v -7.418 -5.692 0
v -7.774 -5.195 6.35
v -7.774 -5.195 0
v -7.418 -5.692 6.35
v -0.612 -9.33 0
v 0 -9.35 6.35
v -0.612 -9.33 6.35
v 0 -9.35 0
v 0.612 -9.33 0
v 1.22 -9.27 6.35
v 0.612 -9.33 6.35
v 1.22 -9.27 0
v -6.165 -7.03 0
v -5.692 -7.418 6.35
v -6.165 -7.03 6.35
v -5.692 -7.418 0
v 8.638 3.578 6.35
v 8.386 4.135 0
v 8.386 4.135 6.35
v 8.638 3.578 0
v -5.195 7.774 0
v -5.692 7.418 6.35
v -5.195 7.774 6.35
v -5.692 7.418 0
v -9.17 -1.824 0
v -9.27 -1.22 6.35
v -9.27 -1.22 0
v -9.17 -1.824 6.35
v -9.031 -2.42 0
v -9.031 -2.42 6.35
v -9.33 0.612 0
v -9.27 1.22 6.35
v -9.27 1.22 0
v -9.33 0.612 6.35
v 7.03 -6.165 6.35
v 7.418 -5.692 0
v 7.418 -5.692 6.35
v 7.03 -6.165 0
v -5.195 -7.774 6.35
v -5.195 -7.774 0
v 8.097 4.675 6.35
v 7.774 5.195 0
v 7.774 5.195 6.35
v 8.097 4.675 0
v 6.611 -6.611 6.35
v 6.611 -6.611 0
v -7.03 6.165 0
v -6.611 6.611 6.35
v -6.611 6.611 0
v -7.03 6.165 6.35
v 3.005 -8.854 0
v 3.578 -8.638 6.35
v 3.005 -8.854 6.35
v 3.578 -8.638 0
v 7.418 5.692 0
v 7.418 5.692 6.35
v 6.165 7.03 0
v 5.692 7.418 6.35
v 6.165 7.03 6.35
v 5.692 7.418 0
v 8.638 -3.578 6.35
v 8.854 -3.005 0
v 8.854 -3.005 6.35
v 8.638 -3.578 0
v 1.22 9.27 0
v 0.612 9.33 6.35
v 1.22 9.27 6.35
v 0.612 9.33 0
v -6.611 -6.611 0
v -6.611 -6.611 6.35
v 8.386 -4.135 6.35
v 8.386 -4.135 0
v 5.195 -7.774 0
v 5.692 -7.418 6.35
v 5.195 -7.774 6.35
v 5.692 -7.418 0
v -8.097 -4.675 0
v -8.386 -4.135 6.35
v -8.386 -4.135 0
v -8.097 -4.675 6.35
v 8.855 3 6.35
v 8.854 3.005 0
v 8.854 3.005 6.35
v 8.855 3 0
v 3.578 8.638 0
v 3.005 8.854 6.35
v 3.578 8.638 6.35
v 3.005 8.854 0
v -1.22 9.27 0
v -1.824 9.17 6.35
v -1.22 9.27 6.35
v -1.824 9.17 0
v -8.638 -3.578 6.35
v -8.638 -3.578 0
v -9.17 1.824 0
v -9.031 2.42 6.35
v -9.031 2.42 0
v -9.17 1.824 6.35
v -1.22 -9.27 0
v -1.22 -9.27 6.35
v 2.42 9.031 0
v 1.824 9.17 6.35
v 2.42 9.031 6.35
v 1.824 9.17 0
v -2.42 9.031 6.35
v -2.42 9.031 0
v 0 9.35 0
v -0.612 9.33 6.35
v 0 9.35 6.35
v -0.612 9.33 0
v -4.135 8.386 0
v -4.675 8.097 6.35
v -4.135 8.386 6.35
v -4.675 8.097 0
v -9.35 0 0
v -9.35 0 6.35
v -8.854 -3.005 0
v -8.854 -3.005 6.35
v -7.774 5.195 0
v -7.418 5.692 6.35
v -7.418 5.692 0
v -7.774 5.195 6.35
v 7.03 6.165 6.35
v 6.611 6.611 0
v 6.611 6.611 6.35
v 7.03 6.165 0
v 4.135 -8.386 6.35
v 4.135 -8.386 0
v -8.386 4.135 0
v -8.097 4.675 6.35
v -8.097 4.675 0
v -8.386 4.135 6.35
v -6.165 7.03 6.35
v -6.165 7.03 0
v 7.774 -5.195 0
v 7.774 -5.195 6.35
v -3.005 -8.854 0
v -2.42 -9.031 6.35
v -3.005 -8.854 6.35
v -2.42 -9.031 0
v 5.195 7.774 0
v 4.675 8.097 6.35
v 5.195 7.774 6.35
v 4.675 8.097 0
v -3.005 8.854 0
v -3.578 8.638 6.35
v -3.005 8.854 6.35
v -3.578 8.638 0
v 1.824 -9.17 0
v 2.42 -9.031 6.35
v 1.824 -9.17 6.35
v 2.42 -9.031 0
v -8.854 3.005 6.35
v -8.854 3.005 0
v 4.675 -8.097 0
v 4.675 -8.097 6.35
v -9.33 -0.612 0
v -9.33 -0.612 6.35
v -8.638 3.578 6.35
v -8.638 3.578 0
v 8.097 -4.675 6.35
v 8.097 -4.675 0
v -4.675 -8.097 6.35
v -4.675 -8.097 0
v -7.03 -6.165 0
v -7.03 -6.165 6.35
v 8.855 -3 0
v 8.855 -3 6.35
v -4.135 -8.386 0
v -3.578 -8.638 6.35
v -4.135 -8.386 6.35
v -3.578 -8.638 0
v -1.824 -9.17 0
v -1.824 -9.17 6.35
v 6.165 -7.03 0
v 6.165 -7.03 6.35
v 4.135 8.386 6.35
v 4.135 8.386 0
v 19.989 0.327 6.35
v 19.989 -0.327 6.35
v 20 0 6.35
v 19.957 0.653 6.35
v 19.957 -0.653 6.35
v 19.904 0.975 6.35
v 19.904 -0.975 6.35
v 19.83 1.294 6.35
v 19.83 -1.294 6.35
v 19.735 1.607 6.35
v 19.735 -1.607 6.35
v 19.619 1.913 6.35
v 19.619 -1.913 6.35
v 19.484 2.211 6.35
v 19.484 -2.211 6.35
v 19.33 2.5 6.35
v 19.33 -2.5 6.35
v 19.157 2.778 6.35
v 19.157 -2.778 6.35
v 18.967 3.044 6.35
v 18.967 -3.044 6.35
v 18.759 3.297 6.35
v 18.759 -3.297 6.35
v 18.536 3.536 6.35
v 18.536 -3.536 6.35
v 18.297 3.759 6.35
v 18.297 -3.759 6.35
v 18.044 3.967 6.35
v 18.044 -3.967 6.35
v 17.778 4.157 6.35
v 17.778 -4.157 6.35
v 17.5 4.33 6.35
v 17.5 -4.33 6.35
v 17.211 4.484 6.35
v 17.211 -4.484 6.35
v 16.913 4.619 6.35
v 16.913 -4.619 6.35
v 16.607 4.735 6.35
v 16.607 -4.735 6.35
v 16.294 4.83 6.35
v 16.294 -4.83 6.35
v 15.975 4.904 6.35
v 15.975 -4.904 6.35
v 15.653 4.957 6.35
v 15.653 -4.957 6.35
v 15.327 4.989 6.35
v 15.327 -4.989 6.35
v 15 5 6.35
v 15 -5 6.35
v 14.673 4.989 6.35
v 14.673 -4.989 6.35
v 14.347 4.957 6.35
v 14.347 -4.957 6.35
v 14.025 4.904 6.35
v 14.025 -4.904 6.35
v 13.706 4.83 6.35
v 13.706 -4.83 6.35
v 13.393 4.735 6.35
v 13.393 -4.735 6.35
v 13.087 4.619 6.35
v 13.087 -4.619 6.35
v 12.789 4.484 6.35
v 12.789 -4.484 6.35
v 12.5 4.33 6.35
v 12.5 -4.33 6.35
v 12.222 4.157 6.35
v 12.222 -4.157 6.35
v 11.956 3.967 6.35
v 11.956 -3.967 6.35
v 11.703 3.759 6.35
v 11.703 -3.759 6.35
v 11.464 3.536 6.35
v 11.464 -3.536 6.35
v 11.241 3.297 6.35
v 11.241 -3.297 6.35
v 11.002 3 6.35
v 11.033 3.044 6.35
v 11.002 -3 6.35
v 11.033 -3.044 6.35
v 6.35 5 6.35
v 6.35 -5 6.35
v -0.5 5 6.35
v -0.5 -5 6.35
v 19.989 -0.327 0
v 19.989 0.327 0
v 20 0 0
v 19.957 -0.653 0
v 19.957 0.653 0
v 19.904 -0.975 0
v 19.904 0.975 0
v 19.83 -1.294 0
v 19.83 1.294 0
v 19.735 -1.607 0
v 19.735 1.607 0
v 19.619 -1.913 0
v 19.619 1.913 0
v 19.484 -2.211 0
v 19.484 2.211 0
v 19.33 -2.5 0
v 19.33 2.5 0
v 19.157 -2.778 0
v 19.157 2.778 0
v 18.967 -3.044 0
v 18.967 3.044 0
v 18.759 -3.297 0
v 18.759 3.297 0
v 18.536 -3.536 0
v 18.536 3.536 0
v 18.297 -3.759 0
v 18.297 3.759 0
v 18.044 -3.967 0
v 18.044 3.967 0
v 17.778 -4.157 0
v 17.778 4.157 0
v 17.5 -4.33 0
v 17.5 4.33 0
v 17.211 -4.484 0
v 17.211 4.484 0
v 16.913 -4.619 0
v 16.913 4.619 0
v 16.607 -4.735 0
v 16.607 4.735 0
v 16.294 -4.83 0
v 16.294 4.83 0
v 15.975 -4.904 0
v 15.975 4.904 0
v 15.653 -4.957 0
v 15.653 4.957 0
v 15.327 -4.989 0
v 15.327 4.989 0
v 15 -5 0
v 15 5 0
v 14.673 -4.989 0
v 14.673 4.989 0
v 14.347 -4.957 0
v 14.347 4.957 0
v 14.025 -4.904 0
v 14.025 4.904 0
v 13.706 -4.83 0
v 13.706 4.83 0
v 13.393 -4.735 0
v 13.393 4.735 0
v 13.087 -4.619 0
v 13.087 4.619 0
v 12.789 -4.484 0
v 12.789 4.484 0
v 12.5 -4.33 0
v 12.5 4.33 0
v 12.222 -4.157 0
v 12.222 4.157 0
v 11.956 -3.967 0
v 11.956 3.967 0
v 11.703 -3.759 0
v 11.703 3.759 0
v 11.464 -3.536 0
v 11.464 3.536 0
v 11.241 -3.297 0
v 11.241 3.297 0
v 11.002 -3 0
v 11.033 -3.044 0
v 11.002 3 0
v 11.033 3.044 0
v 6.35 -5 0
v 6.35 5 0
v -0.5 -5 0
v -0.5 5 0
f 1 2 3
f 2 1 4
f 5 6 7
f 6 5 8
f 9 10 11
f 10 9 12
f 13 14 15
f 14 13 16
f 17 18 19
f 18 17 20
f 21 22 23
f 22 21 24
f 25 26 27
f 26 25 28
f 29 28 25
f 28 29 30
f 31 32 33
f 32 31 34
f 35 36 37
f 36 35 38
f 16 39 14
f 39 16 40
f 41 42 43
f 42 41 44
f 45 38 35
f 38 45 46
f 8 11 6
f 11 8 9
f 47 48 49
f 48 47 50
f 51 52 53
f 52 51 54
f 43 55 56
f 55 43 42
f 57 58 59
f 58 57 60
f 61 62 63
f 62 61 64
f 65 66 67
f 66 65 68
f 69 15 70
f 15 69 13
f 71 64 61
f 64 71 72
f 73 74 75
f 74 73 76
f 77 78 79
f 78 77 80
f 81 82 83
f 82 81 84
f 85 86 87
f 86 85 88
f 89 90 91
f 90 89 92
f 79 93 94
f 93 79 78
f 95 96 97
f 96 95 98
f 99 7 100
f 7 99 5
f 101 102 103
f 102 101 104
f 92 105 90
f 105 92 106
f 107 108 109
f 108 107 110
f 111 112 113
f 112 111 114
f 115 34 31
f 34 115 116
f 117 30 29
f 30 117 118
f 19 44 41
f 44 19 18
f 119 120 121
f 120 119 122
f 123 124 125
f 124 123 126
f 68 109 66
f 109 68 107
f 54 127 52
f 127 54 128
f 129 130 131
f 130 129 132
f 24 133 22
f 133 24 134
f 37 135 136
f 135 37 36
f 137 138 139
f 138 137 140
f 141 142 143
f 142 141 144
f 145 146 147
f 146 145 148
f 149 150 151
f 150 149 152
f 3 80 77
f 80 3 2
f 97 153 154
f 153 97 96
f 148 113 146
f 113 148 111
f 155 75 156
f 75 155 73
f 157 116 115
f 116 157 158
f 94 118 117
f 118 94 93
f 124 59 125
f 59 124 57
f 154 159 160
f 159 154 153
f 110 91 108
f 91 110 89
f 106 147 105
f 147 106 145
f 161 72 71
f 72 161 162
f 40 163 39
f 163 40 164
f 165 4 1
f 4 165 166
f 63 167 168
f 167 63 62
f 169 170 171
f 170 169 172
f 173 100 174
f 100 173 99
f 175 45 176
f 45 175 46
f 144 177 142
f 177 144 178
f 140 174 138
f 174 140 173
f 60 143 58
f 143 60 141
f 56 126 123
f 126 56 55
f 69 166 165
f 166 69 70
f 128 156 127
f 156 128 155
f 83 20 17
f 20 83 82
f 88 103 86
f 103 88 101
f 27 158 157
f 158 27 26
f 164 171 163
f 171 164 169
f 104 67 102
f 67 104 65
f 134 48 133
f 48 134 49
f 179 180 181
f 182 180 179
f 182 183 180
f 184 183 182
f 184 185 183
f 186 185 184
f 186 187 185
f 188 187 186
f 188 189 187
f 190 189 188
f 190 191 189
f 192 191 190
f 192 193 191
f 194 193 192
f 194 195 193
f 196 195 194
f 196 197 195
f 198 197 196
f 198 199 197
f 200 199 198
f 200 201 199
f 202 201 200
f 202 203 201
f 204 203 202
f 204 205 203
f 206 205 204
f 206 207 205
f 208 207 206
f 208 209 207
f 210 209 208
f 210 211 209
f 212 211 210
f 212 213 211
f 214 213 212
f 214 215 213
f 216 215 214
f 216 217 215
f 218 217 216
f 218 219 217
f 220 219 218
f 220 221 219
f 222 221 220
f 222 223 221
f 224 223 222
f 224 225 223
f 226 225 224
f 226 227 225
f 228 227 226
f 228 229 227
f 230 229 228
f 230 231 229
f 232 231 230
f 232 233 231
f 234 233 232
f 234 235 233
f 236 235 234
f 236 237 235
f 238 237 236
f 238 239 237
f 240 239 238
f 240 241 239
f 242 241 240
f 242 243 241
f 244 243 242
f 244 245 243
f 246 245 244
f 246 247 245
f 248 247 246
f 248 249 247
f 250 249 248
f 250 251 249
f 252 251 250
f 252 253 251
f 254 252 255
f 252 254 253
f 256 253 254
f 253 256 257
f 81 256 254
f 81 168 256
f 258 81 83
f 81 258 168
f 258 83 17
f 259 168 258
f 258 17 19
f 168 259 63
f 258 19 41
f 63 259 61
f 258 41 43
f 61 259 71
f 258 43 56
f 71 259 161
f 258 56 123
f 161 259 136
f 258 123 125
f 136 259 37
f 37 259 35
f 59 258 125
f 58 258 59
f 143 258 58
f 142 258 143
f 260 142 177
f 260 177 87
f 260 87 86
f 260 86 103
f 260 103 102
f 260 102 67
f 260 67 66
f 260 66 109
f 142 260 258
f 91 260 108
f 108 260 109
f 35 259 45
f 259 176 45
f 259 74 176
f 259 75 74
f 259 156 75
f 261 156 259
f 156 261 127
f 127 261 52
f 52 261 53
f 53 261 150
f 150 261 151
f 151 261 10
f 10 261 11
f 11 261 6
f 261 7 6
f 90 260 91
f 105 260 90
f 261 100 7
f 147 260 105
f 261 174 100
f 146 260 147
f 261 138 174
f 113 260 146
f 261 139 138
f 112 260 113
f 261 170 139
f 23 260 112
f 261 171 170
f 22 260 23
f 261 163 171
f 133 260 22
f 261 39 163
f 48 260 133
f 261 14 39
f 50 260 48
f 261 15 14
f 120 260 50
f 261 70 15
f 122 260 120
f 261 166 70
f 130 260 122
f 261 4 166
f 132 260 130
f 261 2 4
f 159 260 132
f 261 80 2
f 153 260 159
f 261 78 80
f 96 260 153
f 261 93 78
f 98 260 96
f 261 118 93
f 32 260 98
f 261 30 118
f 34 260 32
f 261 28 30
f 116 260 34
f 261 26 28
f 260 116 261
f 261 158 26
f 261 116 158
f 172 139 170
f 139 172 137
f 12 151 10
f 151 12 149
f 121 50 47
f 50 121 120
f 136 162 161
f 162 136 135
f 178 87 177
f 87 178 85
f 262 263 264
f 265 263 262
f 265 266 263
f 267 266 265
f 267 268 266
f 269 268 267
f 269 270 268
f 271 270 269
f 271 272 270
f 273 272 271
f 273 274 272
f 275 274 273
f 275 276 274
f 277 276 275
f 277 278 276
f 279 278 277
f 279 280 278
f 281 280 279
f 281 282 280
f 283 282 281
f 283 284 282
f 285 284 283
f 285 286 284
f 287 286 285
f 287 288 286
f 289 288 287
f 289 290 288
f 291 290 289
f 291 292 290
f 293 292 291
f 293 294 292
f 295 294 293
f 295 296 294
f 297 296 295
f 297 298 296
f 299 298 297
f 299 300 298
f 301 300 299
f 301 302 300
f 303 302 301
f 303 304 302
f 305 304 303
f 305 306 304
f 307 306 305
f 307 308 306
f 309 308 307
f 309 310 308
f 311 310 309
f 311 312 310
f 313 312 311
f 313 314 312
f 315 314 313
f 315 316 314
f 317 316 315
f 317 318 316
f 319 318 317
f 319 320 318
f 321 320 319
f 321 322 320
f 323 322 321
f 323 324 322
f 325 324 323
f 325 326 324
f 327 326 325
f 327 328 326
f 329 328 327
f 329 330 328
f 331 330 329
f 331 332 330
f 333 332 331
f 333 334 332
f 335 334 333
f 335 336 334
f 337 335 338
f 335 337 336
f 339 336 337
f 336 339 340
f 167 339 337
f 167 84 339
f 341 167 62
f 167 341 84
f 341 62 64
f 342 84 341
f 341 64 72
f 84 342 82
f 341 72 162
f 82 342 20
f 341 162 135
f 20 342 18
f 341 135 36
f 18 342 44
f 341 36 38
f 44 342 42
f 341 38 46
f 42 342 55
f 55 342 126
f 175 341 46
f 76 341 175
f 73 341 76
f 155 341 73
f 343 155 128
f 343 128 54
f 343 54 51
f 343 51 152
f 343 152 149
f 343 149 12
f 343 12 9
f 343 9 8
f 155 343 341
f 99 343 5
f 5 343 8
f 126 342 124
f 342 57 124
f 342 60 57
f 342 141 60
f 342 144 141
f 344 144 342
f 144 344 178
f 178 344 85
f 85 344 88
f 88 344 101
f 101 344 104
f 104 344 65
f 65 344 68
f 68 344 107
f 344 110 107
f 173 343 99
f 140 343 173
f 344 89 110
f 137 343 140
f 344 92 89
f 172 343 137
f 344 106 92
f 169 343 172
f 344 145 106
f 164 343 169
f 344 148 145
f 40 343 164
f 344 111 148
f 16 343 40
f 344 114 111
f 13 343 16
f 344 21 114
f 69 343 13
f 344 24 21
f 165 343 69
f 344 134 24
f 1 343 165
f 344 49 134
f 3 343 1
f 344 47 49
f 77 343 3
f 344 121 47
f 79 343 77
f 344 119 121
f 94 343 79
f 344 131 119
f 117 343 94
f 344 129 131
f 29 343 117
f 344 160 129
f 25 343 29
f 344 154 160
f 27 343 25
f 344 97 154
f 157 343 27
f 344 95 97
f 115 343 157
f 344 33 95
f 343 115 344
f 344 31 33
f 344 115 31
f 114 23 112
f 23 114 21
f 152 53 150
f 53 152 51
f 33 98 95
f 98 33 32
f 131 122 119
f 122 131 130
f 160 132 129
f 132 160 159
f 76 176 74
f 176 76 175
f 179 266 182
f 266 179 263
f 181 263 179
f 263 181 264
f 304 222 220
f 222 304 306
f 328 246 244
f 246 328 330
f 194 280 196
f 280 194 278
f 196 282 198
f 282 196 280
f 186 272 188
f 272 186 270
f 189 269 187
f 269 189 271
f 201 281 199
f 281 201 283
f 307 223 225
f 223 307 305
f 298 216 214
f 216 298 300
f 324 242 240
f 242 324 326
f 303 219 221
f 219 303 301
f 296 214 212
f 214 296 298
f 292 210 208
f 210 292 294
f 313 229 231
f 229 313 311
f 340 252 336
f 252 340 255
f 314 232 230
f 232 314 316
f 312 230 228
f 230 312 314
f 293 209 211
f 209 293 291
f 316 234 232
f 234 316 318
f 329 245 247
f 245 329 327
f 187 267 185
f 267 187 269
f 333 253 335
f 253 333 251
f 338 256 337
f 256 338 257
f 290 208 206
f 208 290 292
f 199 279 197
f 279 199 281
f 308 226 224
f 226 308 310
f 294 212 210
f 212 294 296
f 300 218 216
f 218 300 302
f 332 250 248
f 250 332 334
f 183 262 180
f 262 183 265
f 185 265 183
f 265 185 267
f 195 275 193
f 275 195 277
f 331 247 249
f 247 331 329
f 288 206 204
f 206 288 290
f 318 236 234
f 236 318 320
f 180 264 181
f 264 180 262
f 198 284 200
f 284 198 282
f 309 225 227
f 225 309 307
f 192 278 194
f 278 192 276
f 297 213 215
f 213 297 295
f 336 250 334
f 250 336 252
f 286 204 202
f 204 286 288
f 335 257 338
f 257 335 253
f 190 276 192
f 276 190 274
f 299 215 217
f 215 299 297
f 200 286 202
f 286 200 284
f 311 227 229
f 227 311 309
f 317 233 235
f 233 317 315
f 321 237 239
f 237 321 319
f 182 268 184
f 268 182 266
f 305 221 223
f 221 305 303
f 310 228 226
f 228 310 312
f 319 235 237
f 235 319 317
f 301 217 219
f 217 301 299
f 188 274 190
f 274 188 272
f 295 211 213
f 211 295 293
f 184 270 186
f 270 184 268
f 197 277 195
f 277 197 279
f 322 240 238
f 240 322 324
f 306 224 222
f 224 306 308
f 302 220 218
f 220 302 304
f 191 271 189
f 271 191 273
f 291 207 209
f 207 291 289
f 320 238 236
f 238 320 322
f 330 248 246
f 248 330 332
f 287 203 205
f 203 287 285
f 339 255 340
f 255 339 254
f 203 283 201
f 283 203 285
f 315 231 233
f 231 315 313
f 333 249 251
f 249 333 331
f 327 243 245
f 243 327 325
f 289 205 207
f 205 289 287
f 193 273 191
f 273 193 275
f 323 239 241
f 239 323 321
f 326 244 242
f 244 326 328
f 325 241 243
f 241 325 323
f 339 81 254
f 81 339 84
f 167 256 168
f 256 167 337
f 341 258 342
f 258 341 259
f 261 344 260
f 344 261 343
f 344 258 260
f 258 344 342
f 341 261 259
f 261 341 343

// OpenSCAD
// Tubing clip for a 12.7 mm lab stand rod
// Print orientation: flat on the bed, extruded upward along +Z

// ---------------- Parameters ----------------
ring_id      = 12.7;   // rod ring inner diameter (stand rod clearance)
ring_wall    = 3;      // rod ring wall thickness
ring_od      = ring_id + 2 * ring_wall; // rod ring outer diameter (18.7)
ring_x0      = 0;      // rod ring centre X
ring_y0      = 0;      // rod ring centre Y

tube_id      = 6;      // tubing ring inner diameter
tube_wall    = 2;      // tubing ring wall thickness
tube_od      = tube_id + 2 * tube_wall; // tubing ring outer diameter (10)
tube_x0      = 15;     // tubing ring centre X
tube_y0      = 0;      // tubing ring centre Y

bridge_x0    = 10;     // bridge centre X (between x = 8 and x = 12)
bridge_x1    = 8;      // bridge start X
bridge_x2    = 12;     // bridge end X
bridge_w     = 6;      // bridge width along Y

eps          = 0.5;    // cutter overshoot past faces

$fn = 96;

// ---------------- Model ----------------
difference() {
    union() {
        // Rod ring
        cylinder(d = ring_od, h = ring_id / 2);
        // Tubing ring
        translate([tube_x0, tube_y0, 0])
            cylinder(d = tube_od, h = ring_id / 2);
        // Solid bridge
        translate([bridge_x1, -bridge_w / 2, 0])
            cube([bridge_x2 - bridge_x1, bridge_w, ring_id / 2]);
    }

    // Rod ring opening: full -X side where x < 0 and -5 < y < 5
    translate([ring_x0 - eps, ring_y0 - 5, -eps])
        cube([ring_id / 2 + eps, 10, ring_id / 2 + eps]);

    // Tubing ring opening: +X side where x > 15 and -2.25 < y < 2.25
    translate([tube_x0, tube_y0 - 2.25, -eps])
        cube([tube_od - tube_x0 + eps, 4.5, tube_od + 2 * eps]);
}
